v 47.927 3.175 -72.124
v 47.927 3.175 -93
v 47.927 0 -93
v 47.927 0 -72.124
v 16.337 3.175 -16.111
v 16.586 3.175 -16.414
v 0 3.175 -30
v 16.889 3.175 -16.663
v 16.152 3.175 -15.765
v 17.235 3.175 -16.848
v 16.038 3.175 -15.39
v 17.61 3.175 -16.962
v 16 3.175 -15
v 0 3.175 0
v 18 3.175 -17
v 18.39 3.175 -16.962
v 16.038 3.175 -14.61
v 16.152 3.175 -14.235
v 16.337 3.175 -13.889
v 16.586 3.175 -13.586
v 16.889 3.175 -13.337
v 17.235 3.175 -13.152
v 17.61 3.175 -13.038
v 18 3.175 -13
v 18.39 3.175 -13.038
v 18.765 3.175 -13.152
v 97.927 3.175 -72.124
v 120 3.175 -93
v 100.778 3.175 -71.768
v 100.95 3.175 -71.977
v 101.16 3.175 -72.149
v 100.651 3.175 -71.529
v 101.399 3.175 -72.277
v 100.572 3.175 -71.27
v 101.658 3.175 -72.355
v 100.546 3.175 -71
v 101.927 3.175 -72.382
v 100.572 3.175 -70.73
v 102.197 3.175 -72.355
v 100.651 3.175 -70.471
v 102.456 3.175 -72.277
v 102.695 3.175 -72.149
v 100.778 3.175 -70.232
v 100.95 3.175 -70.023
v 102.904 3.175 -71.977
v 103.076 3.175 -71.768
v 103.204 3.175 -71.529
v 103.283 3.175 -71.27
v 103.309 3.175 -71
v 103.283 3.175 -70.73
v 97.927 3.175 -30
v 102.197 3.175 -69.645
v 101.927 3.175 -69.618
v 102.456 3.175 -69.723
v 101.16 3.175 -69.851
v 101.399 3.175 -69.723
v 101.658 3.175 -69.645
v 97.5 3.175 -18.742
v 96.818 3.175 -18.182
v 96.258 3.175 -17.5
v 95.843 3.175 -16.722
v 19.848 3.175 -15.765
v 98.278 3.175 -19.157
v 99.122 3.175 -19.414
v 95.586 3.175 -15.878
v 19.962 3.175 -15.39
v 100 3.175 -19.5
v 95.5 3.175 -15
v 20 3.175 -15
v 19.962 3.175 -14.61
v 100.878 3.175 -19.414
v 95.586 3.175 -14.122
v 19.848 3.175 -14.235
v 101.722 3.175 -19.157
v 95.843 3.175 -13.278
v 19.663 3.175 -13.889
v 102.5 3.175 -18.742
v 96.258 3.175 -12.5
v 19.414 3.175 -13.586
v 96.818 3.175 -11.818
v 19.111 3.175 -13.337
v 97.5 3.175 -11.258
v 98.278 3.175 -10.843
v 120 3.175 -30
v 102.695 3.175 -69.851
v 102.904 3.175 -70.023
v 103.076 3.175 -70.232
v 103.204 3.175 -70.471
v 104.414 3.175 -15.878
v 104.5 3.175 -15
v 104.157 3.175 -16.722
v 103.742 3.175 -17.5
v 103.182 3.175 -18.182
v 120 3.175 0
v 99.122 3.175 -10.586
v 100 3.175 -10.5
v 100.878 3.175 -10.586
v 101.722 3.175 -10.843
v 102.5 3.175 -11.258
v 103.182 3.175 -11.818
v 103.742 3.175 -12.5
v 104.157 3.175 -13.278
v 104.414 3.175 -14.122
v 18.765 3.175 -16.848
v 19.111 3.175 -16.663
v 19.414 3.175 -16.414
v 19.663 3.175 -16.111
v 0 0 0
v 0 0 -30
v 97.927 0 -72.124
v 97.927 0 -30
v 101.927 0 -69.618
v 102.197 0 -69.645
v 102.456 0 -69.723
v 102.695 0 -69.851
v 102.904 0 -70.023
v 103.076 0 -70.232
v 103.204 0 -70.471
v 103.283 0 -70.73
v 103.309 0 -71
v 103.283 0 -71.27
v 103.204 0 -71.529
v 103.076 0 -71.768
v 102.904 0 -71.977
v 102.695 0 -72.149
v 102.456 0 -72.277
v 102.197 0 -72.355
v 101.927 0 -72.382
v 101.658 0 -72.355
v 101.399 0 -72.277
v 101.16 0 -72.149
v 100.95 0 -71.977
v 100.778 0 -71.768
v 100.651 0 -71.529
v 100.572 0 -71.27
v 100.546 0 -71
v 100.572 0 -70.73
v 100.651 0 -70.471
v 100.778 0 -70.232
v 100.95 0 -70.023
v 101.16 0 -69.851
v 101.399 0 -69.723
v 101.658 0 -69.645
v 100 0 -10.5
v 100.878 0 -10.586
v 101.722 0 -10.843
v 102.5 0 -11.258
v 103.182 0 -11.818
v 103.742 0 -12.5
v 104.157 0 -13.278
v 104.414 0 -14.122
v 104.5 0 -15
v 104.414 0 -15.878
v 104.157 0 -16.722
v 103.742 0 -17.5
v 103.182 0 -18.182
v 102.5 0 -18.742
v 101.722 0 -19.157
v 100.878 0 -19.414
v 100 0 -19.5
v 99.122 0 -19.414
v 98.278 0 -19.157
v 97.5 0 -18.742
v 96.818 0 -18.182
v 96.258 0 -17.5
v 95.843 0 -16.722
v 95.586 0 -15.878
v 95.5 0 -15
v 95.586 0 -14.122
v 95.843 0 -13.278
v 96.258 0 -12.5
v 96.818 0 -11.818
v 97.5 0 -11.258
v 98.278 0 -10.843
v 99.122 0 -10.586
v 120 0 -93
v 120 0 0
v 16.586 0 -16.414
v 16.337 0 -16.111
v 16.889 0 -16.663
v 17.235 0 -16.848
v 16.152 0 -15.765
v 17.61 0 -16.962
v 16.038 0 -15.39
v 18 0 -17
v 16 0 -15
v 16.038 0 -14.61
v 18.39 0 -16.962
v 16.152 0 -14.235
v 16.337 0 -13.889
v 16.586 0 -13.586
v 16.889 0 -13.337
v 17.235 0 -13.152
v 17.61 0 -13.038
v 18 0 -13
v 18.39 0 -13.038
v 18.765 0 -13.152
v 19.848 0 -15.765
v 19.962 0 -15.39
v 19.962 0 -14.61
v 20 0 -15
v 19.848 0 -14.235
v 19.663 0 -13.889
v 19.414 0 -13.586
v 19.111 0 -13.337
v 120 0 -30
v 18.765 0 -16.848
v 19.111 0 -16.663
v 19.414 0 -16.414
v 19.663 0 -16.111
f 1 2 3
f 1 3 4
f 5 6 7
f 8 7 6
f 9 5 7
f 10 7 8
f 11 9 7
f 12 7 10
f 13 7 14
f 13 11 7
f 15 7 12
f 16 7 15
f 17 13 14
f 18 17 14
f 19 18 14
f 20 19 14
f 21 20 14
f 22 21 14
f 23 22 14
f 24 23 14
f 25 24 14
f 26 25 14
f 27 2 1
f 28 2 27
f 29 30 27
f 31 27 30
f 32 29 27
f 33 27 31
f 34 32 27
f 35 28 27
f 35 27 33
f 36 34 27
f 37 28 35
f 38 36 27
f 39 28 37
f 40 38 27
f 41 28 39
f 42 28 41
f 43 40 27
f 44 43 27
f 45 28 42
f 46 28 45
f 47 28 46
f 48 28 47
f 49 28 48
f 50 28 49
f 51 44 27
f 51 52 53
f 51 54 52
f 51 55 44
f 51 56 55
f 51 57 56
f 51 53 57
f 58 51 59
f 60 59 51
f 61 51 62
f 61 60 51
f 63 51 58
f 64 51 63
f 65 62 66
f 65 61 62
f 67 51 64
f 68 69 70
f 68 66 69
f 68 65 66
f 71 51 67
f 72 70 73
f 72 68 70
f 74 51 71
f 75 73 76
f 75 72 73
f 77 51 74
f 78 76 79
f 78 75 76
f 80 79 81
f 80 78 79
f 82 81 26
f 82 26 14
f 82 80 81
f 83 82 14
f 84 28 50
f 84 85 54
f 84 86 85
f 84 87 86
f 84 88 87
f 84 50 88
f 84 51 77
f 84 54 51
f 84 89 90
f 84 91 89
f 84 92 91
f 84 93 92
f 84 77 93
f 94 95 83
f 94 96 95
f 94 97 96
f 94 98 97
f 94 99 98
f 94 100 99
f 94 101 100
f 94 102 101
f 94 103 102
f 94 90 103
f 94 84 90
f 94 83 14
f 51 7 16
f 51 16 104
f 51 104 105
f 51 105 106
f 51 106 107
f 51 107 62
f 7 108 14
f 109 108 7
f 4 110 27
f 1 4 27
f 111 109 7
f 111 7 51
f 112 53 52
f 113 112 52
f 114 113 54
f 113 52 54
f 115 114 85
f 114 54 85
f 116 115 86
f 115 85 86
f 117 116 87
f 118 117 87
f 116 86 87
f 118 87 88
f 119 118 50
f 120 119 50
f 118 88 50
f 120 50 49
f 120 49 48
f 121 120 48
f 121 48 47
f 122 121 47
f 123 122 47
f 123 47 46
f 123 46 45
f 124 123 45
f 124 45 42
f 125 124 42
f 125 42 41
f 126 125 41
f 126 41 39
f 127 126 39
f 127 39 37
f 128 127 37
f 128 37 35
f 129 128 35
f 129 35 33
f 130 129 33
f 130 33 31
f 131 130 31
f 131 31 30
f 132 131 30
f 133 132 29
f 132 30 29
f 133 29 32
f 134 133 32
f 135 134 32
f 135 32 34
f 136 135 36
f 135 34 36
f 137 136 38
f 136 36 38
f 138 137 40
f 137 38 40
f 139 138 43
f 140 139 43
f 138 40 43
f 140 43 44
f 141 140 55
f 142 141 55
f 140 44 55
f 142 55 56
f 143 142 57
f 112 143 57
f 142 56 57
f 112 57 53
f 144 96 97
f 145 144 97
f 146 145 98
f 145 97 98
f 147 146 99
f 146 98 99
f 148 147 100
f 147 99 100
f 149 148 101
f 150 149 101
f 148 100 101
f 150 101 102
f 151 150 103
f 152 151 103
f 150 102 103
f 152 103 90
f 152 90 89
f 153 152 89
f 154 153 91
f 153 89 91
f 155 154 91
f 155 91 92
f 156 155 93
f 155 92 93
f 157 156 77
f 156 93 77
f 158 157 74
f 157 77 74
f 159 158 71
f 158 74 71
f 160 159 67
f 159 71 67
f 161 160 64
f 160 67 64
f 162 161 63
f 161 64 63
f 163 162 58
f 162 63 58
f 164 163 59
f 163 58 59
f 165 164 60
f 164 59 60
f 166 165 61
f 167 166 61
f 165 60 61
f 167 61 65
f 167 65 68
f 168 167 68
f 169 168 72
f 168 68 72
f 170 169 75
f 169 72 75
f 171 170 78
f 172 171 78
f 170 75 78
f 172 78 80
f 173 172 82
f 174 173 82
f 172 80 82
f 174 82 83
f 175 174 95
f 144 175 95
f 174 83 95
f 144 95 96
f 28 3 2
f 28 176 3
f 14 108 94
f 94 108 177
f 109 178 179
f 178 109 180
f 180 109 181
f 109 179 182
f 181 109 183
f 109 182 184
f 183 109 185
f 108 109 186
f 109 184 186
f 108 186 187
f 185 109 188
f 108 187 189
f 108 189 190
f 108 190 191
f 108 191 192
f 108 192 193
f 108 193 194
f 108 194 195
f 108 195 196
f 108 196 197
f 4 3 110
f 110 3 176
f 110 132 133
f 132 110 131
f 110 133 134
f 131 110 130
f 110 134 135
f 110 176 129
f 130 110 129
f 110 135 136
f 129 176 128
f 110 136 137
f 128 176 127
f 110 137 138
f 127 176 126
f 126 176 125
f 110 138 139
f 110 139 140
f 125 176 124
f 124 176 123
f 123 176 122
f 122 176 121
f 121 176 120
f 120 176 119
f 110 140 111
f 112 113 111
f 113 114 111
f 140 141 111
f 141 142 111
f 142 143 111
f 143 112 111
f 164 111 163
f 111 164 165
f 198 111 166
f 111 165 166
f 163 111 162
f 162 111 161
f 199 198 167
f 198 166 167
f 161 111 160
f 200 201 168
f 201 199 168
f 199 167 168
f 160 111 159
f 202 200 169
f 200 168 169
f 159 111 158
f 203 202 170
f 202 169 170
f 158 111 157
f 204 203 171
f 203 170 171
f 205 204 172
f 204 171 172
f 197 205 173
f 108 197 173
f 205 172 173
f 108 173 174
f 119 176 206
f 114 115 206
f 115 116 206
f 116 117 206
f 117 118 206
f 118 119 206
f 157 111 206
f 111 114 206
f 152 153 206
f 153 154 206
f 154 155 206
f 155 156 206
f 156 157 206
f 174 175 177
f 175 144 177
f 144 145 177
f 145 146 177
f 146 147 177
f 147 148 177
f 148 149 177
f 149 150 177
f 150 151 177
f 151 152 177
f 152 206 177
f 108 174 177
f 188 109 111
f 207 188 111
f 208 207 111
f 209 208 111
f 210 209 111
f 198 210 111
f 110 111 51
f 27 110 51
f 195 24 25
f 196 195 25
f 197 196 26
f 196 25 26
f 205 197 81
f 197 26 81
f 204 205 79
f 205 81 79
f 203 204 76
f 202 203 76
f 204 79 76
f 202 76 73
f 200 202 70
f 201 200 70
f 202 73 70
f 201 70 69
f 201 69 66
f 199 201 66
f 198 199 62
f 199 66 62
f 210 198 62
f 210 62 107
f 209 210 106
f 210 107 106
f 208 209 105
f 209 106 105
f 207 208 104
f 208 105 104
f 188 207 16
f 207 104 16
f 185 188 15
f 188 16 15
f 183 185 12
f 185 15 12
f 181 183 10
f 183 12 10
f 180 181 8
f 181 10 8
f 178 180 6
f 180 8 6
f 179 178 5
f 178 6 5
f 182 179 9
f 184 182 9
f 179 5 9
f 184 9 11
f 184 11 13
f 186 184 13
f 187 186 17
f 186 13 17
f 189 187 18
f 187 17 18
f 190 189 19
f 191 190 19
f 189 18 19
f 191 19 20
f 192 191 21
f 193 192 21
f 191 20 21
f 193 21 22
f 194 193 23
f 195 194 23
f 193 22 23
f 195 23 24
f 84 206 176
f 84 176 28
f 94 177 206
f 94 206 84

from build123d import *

# Parameters (mm, degrees)
SKETCH1_W           = 120
SKETCH1_H           = 30
BOSS_EXTRUDE1_DEPTH = 3.175
SKETCH2_R           = 2
SKETCH2_R_2         = 4.5
CUT_EXTRUDE1_DEPTH  = 3.175
SKETCH3_W           = 22.072613883
SKETCH3_H           = 3.175
BOSS_EXTRUDE2_DEPTH = 63
SKETCH4_R           = 1.381817411
CUT_EXTRUDE2_DEPTH  = 10
SKETCH5_W           = 20.875808172
SKETCH5_H           = 3.175
BOSS_EXTRUDE3_DEPTH = 50


with BuildPart() as part:
    # Sketch1 → Boss-Extrude1 (new body)
    with BuildSketch(Plane(origin=(0, 0, 0), x_dir=(1, 0, 0), z_dir=(0, 1, 0))):
        with Locations((60, 15)):
            Rectangle(SKETCH1_W, SKETCH1_H)
    extrude(amount=BOSS_EXTRUDE1_DEPTH)

    # Sketch2 → Cut-Extrude1 (cut)
    with BuildSketch(Plane(origin=(0, 3.175, 0), x_dir=(1, 0, 0), z_dir=(0, 1, 0))):
        with Locations(Location((18, 15, 0), (0, 0, 270))):
            Circle(SKETCH2_R)
        with Locations(Location((100, 15, 0), (0, 0, 270))):
            Circle(SKETCH2_R_2)
    extrude(amount=-CUT_EXTRUDE1_DEPTH, mode=Mode.SUBTRACT)

    # Sketch3 → Boss-Extrude2 (add)
    with BuildSketch(Plane(origin=(0, 0, -30), x_dir=(-1, 0, 0), z_dir=(0, 0, -1))):
        with Locations((-108.963693059, 1.5875)):
            Rectangle(SKETCH3_W, SKETCH3_H)
    extrude(amount=BOSS_EXTRUDE2_DEPTH)

    # Sketch4 → Cut-Extrude2 (cut)
    with BuildSketch(Plane(origin=(0, 3.175, 0), x_dir=(1, 0, 0), z_dir=(0, 1, 0))):
        with Locations(Location((101.927386117, 71, 0), (0, 0, 270))):
            Circle(SKETCH4_R)
    extrude(amount=-CUT_EXTRUDE2_DEPTH, mode=Mode.SUBTRACT)

    # Sketch5 → Boss-Extrude3 (add)
    with BuildSketch(Plane.ZY.offset(-97.927386117)):
        with Locations((-82.562095914, 1.5875)):
            Rectangle(SKETCH5_W, SKETCH5_H)
    extrude(amount=BOSS_EXTRUDE3_DEPTH)


solid = part.part
